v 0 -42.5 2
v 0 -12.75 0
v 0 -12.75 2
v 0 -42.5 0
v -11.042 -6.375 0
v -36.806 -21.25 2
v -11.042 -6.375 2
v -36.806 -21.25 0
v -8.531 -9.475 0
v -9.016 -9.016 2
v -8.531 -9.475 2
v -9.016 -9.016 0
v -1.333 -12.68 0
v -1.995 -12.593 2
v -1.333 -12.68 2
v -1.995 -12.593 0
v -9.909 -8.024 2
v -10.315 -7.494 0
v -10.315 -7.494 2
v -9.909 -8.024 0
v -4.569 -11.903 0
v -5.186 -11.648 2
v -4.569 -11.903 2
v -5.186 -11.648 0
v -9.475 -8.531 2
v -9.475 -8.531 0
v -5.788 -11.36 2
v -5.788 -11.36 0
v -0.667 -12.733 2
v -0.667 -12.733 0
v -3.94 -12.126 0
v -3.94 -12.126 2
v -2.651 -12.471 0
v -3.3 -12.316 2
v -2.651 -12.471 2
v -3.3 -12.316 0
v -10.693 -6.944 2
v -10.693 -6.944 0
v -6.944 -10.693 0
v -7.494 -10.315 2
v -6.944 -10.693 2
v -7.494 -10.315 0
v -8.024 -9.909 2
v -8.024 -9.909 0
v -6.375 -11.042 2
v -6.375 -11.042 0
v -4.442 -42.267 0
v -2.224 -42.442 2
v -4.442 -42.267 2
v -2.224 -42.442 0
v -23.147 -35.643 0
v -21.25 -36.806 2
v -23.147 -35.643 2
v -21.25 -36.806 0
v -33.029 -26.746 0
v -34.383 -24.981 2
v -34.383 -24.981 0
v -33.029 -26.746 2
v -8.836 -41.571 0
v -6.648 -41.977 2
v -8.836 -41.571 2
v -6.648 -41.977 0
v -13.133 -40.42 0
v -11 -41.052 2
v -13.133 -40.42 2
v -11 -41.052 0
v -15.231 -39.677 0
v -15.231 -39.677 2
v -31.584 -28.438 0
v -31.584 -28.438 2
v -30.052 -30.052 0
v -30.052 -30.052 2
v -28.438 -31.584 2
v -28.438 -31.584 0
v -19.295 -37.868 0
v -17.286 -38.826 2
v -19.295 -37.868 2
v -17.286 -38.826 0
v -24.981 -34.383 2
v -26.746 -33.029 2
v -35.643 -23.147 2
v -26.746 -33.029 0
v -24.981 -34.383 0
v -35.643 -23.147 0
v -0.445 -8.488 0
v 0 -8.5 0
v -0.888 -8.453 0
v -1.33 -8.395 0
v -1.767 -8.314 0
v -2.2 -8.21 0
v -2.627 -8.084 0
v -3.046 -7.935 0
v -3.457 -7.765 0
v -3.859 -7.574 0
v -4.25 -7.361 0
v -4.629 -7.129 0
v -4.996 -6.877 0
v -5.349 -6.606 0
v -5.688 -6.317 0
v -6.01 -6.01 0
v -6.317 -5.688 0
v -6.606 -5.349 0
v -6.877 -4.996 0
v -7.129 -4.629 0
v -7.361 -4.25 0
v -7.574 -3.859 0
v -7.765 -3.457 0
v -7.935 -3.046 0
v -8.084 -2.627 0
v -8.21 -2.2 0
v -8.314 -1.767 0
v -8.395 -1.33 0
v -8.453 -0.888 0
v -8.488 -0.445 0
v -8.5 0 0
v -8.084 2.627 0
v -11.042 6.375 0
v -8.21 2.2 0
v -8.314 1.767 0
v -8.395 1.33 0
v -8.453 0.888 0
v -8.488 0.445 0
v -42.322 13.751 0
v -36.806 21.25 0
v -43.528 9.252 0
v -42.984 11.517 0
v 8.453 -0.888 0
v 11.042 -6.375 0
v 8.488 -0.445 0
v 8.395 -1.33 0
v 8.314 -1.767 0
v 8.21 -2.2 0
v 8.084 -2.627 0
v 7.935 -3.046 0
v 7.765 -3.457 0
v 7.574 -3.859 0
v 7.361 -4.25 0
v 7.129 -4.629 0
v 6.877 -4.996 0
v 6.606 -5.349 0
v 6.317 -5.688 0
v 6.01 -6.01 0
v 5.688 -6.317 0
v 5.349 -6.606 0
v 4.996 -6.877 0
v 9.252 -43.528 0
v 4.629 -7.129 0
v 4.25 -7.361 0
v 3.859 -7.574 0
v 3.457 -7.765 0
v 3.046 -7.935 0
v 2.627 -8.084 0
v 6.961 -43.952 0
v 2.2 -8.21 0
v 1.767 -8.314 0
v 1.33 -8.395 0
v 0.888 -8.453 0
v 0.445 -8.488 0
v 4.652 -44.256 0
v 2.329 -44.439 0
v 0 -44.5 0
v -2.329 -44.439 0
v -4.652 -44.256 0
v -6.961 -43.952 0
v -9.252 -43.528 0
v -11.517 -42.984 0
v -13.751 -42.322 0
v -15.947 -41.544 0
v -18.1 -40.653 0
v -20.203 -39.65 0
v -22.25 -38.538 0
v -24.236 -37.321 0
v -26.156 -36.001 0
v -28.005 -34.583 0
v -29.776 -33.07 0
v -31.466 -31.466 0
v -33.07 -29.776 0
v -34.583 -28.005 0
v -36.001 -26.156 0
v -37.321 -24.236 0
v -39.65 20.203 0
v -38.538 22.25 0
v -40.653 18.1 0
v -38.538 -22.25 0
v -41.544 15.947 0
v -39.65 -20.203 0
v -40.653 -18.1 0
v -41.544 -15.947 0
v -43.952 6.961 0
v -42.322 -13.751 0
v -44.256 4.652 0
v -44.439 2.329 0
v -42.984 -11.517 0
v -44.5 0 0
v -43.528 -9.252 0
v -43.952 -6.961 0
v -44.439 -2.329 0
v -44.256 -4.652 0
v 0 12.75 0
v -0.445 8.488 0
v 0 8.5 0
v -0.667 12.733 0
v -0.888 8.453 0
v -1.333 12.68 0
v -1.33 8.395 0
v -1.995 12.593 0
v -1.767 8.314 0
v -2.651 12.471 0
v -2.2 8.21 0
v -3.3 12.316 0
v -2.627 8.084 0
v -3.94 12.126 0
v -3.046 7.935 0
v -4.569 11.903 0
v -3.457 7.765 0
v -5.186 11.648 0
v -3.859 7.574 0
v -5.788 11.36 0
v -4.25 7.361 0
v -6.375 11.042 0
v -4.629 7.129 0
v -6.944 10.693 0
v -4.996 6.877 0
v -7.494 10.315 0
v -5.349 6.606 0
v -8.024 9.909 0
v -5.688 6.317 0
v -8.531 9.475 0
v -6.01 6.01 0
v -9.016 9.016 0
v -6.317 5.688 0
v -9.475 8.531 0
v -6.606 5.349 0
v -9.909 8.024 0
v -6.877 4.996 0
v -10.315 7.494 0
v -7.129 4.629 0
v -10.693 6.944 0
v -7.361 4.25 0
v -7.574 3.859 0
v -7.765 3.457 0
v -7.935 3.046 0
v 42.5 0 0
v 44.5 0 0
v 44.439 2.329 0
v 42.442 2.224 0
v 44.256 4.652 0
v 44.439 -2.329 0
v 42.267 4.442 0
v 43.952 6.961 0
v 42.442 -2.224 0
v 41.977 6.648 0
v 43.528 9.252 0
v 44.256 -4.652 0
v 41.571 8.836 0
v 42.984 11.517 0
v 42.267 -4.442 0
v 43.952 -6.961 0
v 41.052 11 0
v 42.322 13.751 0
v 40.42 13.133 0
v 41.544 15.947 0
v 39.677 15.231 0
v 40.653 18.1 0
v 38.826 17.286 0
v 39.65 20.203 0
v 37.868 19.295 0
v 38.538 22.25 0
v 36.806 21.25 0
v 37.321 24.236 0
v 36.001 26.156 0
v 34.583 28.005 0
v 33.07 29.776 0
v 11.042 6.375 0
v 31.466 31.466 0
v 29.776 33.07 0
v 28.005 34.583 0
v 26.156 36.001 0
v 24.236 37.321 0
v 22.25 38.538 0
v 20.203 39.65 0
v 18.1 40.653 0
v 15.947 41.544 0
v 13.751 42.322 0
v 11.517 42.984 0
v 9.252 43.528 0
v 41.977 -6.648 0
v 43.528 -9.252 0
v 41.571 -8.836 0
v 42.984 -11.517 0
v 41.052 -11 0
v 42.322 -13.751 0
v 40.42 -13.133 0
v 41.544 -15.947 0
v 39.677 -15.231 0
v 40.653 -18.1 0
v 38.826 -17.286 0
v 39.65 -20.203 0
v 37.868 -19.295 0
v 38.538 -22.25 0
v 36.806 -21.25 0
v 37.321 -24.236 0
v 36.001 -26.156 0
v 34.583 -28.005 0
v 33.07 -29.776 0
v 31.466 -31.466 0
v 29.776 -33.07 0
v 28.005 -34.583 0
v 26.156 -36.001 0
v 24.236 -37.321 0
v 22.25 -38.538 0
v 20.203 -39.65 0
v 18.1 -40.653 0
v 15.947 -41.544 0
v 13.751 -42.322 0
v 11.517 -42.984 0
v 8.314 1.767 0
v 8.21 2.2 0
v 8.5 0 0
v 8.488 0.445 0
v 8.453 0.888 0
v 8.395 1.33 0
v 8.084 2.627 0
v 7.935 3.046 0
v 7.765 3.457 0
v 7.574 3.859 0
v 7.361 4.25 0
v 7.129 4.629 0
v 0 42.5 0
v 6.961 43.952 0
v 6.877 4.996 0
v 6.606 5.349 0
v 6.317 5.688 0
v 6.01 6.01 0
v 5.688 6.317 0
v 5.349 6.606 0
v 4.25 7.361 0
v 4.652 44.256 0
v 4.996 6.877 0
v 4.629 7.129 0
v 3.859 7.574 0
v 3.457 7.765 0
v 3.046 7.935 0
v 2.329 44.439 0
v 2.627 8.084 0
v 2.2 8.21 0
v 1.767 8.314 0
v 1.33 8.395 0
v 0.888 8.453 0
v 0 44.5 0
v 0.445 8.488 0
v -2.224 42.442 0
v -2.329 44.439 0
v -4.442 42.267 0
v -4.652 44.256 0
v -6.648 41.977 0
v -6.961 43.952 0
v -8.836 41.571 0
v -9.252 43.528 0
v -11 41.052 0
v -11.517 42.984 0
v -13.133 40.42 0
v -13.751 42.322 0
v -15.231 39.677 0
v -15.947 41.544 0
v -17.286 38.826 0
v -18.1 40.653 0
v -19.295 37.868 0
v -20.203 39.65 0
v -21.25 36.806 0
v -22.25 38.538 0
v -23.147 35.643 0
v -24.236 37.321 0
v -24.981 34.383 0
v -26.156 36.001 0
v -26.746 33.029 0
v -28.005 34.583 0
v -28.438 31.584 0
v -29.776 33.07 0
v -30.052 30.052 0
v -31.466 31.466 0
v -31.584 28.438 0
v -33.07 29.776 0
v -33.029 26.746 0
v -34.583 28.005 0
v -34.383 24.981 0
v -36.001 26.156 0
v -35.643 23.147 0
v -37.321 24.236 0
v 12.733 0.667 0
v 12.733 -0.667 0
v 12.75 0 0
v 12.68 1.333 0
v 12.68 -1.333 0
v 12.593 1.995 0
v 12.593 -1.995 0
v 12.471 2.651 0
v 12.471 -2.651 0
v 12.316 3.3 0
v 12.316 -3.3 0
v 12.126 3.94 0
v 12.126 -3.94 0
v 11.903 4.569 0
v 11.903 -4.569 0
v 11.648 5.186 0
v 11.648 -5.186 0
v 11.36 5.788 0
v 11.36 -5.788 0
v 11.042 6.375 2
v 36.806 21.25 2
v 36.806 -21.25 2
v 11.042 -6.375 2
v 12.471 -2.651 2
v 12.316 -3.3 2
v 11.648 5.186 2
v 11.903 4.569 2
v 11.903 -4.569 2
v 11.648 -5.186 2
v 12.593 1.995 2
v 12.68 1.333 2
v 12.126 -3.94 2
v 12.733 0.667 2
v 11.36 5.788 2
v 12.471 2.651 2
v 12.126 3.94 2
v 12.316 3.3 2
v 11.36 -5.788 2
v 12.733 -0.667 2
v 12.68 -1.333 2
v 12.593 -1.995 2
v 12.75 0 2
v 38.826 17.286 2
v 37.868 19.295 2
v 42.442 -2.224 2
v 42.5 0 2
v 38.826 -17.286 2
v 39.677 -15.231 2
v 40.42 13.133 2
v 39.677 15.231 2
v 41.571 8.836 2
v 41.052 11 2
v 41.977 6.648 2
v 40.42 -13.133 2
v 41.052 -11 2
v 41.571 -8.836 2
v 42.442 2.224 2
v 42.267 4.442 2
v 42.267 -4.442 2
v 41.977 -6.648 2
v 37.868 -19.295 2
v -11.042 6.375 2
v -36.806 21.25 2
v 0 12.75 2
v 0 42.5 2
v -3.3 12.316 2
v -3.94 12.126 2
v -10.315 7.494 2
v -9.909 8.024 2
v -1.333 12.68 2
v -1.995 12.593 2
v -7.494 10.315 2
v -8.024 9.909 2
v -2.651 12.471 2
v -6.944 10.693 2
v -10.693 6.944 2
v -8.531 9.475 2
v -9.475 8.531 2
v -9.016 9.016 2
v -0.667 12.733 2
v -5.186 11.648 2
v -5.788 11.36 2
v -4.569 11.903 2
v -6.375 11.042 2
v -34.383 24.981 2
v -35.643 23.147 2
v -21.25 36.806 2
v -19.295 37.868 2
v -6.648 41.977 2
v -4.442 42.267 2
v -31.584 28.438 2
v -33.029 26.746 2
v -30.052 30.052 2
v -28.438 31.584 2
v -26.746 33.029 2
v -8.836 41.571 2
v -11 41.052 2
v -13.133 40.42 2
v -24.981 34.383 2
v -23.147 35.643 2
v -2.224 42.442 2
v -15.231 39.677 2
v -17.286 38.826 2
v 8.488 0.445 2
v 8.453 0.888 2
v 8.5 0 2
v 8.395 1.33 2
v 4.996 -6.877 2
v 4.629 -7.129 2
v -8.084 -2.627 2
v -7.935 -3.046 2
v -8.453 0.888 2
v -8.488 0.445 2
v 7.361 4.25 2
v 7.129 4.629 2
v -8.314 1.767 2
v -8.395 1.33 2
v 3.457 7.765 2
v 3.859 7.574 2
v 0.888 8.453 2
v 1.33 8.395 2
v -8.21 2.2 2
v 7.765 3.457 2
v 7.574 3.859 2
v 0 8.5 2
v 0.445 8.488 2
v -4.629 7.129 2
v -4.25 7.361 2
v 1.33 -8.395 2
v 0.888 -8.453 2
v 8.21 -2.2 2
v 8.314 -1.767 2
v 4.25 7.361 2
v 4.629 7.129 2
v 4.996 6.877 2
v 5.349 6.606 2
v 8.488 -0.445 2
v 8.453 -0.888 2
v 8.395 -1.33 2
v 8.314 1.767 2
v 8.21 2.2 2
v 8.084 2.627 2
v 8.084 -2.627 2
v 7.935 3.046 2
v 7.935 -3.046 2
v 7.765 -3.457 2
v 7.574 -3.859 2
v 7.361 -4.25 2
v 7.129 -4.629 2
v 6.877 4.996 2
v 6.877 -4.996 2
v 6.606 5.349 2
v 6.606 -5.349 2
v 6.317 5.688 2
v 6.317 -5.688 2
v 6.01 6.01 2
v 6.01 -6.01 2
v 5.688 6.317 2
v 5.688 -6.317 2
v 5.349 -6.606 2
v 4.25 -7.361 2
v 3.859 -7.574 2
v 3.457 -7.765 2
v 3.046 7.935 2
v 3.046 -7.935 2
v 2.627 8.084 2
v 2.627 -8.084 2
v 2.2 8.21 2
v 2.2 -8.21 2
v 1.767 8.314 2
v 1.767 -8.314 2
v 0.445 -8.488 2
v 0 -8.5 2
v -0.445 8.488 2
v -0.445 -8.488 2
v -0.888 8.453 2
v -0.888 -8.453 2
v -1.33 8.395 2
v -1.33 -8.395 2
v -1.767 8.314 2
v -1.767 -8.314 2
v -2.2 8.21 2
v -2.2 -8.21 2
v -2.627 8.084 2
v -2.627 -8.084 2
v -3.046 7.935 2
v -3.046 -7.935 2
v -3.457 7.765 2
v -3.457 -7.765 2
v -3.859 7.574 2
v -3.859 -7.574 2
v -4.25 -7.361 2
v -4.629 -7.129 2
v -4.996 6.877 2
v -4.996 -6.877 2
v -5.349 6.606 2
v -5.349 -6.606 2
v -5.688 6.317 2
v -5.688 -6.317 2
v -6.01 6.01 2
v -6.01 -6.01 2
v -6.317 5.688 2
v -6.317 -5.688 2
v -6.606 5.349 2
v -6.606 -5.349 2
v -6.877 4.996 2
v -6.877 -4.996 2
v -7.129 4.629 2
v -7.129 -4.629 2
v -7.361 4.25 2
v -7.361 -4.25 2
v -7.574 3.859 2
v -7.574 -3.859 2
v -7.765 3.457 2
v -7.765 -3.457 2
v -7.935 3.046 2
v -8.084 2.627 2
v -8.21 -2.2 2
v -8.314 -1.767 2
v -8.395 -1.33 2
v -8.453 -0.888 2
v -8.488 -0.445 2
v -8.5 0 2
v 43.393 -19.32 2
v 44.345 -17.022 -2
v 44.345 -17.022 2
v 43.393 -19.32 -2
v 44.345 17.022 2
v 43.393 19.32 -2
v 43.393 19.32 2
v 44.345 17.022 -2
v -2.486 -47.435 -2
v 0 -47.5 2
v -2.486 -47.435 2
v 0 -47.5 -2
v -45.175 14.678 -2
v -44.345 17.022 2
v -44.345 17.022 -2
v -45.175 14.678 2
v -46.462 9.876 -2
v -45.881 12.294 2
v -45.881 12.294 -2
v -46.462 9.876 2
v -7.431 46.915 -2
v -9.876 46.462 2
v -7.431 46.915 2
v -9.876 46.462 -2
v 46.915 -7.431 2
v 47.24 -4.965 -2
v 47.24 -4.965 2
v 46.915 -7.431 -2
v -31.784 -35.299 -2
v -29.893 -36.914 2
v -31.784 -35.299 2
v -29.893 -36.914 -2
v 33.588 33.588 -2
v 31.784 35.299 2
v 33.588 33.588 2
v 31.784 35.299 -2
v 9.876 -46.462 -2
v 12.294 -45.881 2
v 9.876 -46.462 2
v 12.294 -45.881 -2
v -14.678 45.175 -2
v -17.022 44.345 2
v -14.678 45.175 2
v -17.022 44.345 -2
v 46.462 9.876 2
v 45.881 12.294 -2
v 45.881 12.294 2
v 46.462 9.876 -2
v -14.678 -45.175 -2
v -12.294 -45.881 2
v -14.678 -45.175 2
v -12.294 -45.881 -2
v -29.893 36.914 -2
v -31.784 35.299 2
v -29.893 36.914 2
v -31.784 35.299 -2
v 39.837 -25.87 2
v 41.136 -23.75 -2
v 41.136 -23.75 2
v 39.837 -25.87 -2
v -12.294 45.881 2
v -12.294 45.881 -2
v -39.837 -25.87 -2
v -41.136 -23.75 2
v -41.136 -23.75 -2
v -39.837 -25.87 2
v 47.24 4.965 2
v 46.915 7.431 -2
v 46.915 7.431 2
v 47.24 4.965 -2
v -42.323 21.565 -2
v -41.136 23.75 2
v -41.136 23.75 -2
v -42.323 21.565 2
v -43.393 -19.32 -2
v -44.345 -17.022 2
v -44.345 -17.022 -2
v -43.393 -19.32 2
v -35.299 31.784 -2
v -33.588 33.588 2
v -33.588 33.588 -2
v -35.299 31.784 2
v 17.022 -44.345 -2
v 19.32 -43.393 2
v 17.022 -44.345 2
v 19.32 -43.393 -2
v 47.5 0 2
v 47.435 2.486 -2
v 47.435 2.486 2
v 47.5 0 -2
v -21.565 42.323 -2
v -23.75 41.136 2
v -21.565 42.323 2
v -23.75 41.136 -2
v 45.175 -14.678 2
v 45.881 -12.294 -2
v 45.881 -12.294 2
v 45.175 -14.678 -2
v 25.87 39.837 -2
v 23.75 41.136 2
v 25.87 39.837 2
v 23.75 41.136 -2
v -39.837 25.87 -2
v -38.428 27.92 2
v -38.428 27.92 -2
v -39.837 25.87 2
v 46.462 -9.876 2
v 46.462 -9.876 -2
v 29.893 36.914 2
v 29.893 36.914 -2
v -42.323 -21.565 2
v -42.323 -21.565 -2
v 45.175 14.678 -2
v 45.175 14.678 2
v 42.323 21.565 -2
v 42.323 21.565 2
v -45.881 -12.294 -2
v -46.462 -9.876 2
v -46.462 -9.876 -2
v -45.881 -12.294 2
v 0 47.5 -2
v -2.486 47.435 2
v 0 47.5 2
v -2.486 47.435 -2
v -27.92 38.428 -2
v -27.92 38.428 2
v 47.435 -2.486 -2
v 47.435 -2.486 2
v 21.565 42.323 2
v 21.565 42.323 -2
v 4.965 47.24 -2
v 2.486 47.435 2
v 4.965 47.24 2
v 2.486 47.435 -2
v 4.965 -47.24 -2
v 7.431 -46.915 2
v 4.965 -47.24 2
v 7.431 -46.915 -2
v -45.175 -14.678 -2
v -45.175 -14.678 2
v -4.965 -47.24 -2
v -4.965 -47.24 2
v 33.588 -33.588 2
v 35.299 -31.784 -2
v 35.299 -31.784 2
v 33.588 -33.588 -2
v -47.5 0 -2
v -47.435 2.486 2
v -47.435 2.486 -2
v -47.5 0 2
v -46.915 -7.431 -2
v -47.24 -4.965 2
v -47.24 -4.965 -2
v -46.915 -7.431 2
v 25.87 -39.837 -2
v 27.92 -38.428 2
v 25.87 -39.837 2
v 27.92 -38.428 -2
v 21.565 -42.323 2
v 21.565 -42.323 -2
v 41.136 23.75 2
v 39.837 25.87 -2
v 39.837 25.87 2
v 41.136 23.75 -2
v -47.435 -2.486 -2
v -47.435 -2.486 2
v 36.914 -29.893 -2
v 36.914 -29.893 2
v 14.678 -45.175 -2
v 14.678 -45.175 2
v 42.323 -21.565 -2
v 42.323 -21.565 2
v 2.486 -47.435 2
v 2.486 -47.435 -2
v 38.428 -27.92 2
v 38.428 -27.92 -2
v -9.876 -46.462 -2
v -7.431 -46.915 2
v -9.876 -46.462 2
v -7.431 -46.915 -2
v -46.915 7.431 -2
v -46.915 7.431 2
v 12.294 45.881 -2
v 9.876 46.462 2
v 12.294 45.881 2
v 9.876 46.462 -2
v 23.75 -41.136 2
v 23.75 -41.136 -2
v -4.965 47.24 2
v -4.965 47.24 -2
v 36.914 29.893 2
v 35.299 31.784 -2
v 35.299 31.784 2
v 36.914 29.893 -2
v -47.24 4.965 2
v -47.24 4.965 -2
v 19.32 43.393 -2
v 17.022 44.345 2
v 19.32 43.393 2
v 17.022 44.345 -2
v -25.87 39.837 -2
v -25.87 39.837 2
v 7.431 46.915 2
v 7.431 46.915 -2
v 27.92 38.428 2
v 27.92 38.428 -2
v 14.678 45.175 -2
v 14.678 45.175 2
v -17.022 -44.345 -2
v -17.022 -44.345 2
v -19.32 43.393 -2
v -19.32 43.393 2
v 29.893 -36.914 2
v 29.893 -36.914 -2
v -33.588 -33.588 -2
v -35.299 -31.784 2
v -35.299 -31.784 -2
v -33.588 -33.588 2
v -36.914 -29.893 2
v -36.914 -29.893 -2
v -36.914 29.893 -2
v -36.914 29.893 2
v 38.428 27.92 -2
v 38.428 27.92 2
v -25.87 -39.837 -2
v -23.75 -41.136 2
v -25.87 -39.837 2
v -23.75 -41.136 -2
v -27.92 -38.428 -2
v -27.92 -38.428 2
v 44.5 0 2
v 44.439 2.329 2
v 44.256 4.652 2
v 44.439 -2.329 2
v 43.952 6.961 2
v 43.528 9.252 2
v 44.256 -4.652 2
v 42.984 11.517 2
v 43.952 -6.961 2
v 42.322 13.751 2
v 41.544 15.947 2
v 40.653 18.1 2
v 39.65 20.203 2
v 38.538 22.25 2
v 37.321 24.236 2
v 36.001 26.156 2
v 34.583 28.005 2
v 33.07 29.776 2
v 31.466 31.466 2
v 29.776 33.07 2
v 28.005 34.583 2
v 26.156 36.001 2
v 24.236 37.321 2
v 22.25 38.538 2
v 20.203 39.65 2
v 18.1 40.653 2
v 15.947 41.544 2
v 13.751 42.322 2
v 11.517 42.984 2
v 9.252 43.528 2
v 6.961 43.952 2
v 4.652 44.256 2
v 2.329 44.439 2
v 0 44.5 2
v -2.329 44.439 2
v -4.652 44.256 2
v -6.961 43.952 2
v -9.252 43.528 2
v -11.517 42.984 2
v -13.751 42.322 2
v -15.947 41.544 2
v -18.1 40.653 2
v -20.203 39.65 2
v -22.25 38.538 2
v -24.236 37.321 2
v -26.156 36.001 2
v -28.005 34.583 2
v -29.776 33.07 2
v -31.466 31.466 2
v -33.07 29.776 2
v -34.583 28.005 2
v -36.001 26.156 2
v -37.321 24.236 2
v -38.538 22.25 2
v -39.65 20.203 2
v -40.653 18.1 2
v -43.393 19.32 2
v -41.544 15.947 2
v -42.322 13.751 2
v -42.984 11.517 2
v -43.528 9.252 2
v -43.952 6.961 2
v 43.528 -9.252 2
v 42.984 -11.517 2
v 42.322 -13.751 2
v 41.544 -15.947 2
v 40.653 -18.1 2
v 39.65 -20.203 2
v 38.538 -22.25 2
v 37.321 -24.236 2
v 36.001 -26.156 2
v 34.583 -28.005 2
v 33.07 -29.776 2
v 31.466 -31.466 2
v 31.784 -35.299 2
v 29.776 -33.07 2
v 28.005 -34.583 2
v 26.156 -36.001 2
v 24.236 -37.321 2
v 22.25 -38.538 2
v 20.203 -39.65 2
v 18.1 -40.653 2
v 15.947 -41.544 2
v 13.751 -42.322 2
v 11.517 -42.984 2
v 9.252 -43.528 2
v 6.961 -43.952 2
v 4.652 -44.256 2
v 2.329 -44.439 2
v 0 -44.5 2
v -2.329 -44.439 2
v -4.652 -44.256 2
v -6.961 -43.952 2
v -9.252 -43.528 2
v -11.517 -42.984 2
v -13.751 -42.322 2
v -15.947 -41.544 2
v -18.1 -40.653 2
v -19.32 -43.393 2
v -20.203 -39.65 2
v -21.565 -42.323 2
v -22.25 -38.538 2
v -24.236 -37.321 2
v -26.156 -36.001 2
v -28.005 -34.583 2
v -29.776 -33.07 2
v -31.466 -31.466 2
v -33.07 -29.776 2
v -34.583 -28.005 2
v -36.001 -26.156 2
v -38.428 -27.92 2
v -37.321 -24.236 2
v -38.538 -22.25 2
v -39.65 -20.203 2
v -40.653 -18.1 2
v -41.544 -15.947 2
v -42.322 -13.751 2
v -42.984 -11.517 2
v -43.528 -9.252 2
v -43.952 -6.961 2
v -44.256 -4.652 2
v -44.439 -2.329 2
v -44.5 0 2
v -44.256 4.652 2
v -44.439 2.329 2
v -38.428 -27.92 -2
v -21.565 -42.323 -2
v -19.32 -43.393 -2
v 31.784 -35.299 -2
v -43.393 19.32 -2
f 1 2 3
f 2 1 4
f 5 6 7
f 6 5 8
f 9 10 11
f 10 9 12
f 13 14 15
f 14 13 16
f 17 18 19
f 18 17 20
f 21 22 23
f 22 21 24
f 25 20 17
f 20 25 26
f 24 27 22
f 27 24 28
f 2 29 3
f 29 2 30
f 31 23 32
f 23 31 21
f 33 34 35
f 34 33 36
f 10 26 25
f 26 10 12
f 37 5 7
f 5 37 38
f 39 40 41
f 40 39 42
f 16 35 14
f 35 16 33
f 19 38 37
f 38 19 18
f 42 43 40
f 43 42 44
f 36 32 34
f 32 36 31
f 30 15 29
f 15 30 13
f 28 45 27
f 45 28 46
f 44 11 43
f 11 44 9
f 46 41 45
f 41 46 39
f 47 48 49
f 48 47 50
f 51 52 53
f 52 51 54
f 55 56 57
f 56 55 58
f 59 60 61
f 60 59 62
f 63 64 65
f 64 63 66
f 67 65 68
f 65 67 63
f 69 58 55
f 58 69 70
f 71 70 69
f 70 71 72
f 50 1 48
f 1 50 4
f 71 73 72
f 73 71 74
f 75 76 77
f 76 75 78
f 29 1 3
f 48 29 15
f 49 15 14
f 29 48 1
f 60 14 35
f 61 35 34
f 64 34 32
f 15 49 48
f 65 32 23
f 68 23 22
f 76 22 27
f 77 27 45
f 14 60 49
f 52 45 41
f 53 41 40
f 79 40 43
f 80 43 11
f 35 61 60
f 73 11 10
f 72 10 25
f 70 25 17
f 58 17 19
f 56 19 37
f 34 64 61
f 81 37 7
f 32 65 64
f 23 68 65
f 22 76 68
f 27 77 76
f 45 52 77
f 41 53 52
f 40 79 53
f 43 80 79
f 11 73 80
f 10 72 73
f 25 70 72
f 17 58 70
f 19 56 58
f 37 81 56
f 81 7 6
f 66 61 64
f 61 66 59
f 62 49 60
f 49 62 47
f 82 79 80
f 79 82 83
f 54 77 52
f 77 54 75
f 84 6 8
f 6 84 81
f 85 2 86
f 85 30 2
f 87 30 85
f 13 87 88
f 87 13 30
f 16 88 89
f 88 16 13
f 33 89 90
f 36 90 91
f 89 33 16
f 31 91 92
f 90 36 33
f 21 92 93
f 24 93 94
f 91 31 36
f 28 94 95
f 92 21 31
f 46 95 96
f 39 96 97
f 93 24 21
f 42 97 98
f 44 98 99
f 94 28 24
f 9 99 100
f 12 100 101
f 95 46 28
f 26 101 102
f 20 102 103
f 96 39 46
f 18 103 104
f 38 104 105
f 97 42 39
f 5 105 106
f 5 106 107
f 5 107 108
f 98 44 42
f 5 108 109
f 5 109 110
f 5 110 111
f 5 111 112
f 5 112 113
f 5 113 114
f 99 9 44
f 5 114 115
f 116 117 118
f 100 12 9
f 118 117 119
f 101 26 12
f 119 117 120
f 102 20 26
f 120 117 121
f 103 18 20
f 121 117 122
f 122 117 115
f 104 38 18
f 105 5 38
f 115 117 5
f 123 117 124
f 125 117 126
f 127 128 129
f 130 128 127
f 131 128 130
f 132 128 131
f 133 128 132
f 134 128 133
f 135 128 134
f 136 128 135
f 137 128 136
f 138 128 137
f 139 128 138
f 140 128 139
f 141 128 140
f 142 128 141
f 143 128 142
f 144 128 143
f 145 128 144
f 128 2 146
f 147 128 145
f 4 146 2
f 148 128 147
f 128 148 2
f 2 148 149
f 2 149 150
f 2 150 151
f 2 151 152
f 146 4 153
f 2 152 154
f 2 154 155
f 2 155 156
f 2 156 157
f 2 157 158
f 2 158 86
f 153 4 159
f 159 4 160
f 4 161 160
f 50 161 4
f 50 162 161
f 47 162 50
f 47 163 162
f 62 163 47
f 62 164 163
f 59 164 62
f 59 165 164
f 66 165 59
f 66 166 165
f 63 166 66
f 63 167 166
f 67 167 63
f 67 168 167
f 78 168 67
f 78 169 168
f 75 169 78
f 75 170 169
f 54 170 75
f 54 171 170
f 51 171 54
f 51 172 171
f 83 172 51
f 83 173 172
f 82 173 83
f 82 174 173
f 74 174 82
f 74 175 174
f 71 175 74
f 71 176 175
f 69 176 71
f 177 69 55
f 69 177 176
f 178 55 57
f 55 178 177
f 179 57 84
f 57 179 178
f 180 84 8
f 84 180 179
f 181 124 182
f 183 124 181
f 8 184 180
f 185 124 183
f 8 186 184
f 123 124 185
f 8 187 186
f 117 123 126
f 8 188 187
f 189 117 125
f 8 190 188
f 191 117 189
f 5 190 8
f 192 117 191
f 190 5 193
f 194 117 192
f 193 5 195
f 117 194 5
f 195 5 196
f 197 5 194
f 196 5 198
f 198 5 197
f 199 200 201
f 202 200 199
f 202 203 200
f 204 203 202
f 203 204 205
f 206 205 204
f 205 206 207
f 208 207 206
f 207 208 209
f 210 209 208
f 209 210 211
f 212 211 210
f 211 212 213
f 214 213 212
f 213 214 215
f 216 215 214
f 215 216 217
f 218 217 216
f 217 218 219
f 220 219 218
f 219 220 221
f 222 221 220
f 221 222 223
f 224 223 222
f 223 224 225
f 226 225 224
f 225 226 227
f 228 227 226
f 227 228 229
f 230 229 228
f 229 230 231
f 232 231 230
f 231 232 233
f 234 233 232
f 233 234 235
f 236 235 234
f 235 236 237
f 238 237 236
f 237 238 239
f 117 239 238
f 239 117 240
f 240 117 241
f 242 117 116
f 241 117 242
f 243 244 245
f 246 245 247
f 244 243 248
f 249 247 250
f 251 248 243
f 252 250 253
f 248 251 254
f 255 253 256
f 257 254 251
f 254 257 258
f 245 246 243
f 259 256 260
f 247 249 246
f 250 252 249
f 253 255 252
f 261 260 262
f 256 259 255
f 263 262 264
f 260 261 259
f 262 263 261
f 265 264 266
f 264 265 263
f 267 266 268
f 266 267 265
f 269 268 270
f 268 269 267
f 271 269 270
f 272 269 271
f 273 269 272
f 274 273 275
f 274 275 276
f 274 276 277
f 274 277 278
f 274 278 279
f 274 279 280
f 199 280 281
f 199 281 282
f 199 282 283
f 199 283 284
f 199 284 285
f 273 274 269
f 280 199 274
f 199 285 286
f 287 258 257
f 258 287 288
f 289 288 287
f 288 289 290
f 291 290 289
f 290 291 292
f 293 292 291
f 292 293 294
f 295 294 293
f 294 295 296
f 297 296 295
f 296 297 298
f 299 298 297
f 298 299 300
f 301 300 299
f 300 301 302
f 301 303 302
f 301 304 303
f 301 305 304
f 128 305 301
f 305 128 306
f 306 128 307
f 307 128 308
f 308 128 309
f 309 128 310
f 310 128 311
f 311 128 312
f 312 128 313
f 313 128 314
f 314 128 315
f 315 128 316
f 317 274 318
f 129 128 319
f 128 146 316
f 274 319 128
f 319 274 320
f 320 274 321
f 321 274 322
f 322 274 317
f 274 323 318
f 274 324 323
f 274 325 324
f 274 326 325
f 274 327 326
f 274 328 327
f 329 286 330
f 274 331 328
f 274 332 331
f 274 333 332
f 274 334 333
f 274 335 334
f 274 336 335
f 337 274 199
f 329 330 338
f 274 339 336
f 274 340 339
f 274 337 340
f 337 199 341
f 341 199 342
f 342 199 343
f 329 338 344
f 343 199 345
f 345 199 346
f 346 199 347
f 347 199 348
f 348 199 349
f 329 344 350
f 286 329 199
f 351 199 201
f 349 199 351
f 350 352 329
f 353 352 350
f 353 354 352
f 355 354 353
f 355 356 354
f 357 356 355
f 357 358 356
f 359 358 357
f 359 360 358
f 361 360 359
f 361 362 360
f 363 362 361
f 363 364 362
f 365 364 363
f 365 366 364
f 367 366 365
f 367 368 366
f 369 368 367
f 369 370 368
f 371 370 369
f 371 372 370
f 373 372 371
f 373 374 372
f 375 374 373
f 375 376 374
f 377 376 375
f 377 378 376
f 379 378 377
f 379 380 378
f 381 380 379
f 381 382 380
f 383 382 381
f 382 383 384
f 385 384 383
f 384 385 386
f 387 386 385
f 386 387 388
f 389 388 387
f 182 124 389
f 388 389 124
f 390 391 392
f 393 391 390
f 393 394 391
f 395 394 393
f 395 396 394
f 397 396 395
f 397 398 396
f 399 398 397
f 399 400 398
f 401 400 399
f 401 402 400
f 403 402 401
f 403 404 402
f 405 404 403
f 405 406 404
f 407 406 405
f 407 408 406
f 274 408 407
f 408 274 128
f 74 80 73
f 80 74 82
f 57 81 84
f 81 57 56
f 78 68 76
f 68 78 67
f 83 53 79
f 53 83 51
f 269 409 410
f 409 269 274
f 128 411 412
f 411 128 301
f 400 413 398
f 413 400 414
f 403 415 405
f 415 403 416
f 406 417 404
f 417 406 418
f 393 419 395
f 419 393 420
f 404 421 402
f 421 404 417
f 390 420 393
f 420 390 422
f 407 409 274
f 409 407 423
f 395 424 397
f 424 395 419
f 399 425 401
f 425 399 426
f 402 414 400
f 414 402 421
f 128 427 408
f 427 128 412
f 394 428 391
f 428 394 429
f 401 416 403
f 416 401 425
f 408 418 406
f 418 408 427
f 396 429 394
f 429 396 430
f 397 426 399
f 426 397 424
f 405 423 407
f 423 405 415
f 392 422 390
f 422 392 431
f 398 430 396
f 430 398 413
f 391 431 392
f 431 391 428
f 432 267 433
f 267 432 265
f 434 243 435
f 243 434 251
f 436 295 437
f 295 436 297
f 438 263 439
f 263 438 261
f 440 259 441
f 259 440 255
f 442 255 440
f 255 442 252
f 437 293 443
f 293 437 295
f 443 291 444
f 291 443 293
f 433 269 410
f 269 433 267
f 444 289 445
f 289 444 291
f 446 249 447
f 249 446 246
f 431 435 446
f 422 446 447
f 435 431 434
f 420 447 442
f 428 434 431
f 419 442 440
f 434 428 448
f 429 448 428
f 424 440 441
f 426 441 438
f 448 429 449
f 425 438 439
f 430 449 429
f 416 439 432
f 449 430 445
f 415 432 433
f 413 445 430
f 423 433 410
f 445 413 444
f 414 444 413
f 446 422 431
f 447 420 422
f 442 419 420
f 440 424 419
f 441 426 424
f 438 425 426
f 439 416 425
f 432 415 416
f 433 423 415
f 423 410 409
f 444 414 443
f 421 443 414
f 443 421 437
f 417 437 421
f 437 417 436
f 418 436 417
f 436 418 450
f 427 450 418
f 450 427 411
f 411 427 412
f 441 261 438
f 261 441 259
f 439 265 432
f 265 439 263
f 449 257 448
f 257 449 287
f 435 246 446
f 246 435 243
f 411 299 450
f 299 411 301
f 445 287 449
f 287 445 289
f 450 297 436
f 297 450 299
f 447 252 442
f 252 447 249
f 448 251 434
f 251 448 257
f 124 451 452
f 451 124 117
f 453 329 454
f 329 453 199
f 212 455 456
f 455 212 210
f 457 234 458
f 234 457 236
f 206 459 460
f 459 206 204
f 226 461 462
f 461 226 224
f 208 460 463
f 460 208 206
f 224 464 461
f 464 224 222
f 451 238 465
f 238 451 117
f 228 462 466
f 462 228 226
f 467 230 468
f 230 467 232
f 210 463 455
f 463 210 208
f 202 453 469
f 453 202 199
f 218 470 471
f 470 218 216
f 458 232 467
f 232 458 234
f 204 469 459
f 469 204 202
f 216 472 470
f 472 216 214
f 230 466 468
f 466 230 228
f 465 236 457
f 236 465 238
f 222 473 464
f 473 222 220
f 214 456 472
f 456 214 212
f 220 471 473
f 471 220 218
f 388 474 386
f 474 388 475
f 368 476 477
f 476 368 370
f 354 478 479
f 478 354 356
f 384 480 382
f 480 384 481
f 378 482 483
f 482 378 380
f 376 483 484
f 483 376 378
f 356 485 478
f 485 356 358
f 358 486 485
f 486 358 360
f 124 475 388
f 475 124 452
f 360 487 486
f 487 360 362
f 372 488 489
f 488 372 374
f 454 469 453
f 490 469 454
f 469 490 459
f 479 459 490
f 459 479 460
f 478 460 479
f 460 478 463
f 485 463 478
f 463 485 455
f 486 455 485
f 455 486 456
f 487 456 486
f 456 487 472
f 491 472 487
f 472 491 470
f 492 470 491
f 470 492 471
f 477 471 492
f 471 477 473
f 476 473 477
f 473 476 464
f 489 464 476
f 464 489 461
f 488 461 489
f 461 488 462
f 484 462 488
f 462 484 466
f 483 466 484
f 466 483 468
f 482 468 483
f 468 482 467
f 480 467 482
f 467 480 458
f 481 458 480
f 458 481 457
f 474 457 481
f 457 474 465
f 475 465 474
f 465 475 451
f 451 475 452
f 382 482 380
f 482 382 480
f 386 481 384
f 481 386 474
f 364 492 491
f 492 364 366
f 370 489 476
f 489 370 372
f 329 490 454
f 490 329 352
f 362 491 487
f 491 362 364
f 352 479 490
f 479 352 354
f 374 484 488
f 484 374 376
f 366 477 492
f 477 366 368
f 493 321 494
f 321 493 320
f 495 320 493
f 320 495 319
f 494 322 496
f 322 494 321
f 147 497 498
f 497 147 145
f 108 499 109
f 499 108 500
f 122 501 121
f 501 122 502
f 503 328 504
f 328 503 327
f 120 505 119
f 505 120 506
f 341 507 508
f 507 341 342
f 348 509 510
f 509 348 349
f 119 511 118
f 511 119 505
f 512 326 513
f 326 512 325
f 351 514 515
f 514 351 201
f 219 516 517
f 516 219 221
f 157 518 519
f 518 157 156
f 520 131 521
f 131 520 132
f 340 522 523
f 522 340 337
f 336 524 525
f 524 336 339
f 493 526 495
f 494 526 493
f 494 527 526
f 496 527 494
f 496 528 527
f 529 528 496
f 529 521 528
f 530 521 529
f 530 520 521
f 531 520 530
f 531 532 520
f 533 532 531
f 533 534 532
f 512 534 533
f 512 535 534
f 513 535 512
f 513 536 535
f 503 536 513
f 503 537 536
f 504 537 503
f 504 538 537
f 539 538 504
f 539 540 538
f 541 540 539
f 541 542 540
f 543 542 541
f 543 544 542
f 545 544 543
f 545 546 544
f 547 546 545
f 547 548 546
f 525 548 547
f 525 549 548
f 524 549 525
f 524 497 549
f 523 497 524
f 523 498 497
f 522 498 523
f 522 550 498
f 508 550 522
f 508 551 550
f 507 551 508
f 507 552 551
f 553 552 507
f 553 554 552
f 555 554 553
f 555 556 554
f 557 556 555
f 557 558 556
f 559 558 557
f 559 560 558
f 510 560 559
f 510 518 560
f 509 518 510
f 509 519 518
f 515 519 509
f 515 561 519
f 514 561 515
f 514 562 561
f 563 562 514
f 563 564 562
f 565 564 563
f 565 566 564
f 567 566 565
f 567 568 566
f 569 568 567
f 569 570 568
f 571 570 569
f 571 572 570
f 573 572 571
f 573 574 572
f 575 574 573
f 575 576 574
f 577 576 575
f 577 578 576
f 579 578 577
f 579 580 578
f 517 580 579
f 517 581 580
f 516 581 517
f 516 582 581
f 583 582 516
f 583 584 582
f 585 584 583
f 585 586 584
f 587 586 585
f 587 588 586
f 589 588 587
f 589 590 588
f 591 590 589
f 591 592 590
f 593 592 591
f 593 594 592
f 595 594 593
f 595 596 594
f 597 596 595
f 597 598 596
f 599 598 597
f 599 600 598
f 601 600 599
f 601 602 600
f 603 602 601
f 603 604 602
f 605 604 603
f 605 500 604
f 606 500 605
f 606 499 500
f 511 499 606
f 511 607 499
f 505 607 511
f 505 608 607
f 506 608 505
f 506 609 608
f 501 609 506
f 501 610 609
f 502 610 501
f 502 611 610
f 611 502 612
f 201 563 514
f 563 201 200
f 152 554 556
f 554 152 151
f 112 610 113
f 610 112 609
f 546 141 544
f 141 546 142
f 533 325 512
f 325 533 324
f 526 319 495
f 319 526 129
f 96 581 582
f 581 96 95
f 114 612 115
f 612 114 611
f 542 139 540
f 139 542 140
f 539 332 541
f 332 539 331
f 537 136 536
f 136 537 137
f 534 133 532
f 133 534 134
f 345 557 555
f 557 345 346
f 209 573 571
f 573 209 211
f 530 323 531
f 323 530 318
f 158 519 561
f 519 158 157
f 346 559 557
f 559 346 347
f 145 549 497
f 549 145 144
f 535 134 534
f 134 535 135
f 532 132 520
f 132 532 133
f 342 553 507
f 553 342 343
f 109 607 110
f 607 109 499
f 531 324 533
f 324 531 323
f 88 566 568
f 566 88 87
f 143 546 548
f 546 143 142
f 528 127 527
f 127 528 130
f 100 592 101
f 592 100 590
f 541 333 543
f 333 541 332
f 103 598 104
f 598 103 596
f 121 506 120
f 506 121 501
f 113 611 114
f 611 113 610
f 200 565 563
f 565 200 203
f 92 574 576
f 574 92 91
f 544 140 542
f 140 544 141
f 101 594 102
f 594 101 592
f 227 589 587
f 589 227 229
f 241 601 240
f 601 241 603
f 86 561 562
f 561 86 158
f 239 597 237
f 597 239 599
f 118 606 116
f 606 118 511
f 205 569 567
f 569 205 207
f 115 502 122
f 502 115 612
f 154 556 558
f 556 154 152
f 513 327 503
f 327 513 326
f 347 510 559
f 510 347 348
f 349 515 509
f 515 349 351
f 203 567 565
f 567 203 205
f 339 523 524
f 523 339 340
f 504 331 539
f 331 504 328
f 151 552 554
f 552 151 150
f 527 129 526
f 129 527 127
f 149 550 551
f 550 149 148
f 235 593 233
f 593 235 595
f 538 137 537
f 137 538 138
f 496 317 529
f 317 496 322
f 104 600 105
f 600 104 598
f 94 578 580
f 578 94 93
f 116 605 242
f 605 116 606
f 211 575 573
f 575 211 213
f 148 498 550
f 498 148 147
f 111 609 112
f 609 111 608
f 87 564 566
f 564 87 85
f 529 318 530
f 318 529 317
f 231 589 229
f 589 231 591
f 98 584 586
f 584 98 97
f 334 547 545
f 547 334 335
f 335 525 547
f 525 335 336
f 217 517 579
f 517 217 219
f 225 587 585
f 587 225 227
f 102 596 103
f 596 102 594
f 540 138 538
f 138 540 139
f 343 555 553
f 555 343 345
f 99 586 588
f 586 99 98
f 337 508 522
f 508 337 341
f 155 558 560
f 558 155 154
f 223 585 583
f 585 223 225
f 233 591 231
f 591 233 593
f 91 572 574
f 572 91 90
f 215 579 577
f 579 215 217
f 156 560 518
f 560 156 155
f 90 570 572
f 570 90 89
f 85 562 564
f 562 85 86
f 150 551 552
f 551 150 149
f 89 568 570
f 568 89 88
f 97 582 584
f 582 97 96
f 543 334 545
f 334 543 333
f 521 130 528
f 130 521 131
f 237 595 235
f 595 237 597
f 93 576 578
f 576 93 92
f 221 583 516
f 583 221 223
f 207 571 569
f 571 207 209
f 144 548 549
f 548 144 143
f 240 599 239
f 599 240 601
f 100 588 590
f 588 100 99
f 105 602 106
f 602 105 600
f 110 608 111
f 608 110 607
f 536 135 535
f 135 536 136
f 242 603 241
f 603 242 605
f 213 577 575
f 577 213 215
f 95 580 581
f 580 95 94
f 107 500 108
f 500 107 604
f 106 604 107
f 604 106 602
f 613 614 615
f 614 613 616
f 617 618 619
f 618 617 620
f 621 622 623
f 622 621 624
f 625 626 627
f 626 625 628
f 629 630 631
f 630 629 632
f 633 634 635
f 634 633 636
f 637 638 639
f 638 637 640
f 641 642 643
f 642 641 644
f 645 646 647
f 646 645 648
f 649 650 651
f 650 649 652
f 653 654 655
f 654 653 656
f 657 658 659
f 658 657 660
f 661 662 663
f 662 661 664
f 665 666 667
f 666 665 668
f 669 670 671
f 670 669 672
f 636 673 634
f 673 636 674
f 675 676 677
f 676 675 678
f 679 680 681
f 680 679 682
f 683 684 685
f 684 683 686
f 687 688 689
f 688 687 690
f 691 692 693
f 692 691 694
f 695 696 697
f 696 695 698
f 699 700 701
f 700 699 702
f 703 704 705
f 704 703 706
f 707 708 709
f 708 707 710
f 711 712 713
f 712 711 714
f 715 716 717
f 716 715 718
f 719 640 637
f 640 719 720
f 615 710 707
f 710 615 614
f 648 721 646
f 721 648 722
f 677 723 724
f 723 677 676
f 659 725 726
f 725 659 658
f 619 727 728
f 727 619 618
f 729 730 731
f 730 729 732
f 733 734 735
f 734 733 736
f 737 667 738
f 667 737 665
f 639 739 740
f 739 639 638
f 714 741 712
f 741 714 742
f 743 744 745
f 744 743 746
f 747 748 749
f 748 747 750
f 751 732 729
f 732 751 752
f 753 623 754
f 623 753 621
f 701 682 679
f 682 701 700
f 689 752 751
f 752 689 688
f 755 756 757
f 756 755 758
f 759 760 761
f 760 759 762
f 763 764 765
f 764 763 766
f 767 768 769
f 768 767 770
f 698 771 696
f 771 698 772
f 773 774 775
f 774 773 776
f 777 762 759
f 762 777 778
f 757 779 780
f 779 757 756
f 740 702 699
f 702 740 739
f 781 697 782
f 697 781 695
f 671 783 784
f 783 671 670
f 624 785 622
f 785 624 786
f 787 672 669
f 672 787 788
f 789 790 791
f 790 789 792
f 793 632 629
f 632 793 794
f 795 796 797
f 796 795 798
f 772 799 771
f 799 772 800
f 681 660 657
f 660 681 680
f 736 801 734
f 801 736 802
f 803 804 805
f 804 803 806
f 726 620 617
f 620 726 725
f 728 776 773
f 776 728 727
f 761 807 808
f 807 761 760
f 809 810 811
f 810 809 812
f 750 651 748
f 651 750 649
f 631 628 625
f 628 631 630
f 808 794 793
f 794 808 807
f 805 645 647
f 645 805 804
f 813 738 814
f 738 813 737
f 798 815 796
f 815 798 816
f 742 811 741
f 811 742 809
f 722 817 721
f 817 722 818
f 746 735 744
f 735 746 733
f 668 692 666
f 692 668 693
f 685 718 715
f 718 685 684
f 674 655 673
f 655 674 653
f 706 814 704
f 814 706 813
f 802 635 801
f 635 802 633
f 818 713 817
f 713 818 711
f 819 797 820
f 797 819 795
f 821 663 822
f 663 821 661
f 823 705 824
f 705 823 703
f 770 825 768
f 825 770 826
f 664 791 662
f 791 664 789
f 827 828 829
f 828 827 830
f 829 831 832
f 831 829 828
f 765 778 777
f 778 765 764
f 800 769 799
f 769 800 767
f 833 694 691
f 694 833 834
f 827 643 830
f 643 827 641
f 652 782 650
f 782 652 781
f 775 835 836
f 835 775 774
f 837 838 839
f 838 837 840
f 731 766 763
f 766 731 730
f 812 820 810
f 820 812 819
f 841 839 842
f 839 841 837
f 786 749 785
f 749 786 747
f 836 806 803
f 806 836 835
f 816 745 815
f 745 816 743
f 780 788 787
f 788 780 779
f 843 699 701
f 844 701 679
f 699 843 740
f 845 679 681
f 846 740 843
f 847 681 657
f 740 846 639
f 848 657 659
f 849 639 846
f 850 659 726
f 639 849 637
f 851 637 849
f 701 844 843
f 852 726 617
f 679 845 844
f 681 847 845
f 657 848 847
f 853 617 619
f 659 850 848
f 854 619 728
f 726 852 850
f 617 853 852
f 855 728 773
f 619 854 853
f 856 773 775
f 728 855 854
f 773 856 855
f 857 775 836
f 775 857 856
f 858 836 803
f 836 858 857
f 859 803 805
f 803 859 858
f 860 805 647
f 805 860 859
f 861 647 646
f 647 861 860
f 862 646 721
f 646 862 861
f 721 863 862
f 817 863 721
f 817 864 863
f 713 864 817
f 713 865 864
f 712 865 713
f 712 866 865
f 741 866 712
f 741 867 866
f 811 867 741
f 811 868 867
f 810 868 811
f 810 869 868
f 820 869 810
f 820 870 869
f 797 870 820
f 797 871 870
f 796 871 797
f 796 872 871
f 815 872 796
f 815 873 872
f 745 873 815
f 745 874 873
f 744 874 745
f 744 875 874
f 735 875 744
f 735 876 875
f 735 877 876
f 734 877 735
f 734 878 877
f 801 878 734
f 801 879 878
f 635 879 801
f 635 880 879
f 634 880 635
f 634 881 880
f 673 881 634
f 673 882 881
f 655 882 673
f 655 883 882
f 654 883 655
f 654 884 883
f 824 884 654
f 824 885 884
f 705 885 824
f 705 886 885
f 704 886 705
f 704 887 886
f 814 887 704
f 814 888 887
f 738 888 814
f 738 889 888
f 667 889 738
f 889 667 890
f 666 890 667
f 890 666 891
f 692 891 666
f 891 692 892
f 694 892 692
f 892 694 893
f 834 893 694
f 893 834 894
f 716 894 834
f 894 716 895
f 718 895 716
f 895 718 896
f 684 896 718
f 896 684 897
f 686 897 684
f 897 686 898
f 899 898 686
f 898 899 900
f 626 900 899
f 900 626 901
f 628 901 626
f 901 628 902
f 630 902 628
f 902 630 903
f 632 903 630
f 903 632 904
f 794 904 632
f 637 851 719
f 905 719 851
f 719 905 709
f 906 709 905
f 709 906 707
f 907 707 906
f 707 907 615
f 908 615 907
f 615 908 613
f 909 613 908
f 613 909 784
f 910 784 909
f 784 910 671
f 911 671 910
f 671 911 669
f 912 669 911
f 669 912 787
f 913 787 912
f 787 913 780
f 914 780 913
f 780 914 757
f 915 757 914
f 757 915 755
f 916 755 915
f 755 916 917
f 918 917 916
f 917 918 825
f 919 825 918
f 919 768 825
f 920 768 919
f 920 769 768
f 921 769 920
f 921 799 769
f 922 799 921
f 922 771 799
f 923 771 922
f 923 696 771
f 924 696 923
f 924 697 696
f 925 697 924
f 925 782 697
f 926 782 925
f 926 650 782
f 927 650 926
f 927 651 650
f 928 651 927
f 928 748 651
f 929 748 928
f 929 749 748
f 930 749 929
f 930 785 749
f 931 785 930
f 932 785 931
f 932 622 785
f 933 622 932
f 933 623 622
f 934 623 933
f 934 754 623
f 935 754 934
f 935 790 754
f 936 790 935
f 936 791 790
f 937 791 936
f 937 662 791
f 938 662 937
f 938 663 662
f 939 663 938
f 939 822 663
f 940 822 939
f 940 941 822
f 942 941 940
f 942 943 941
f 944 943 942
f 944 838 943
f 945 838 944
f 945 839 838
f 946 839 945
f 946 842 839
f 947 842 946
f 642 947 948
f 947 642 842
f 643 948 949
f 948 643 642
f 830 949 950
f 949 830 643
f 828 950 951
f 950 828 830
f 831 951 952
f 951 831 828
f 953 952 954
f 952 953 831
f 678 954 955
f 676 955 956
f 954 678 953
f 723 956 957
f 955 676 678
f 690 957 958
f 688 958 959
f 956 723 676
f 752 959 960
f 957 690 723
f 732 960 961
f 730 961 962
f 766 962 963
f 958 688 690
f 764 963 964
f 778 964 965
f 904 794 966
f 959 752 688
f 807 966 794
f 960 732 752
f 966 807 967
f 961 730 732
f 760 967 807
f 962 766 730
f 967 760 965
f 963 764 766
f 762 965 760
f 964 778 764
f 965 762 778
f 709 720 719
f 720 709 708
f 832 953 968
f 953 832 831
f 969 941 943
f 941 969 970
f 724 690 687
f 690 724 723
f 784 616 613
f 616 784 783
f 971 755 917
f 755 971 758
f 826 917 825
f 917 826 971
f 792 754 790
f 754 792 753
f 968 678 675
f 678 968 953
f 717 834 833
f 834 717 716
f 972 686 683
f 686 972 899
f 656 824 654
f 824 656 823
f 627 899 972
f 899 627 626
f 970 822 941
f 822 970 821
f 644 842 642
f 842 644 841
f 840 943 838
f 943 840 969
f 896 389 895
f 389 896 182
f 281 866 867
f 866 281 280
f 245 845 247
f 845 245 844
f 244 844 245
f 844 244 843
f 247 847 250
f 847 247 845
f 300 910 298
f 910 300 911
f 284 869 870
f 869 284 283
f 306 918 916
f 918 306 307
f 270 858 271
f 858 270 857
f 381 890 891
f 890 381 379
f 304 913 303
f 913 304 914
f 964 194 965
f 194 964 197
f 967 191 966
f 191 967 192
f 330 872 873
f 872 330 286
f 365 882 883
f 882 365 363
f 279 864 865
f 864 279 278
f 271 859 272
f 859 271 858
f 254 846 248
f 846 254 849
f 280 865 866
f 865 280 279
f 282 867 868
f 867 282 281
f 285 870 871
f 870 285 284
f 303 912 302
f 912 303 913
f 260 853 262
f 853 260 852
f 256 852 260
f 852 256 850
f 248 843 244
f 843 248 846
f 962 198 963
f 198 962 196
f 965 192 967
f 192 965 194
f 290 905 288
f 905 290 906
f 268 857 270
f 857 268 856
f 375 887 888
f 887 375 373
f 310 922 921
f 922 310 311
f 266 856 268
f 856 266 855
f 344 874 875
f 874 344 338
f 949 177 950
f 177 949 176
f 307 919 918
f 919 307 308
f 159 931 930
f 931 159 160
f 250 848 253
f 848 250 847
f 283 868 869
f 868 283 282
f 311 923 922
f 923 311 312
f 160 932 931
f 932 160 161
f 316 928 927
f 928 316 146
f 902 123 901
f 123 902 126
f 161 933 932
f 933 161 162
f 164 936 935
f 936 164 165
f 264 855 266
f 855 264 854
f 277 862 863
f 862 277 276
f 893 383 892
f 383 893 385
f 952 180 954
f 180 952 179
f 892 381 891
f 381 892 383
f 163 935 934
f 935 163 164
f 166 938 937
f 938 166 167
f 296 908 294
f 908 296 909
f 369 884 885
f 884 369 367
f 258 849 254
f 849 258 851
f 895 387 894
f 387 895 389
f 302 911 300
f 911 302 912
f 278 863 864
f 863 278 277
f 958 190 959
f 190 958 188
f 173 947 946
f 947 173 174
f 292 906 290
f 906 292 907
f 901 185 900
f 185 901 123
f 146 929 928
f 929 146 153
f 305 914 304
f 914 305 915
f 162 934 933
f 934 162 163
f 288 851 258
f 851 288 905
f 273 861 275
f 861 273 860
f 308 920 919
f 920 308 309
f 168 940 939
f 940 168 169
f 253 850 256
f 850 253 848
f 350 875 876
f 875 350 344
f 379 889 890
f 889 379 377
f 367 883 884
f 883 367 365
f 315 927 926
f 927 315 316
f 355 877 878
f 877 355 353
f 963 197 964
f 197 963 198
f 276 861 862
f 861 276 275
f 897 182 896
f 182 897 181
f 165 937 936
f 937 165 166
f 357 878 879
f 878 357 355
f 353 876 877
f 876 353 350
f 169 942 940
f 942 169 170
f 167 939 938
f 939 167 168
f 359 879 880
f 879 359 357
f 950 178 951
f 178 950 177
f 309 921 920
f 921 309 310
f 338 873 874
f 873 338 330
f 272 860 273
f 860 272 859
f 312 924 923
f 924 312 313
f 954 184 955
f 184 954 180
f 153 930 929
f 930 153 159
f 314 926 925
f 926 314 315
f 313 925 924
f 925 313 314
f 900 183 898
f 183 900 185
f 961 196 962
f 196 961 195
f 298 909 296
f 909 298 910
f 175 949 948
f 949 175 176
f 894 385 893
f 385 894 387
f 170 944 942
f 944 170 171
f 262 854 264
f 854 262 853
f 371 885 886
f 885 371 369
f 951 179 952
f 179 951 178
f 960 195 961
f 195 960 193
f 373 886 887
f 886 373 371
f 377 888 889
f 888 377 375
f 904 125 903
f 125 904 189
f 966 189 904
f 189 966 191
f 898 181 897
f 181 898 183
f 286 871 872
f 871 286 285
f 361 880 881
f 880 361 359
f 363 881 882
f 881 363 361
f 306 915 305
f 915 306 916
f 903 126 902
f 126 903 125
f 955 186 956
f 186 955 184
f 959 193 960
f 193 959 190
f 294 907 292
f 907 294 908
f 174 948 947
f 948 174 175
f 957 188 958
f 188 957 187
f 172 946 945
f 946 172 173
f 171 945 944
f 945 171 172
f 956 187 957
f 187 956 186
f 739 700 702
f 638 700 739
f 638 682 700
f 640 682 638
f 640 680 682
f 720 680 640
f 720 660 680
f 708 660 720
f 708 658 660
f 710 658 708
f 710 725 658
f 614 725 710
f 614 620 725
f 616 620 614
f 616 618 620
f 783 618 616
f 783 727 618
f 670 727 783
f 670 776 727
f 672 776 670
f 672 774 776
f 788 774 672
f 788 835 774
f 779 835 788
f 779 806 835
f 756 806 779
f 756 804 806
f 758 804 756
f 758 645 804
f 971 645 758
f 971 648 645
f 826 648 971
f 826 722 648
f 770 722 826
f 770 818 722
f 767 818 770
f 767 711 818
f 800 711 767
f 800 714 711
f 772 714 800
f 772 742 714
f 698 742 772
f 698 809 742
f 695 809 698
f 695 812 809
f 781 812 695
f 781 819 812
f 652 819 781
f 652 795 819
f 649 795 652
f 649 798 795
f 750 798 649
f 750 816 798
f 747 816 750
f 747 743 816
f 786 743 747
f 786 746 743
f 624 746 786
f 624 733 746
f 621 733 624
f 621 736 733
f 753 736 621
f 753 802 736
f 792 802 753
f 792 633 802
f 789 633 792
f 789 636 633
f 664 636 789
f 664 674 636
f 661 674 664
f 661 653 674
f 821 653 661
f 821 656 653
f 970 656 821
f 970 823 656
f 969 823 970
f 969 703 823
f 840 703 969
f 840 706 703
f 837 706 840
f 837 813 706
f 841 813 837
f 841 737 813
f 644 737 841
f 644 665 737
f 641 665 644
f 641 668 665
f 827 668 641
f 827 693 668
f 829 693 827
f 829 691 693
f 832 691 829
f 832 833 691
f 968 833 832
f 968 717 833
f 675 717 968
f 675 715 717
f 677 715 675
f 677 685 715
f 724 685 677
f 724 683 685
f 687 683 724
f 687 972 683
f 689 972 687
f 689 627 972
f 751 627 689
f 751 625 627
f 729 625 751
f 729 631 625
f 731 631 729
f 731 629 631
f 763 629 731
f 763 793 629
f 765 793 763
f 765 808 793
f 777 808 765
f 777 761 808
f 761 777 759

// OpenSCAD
module branch(height,diameter,out_rat){
    difference(){
        cylinder(h=height, d=diameter);
        translate([0, 0, -height/2])
        {
            translate([0,-diameter,])cube([diameter,2*diameter,2*height]);
            rotate([0,0,120]) translate([0, -diameter,0]) cube([diameter,2*diameter,2*height]);
            cylinder(h=2*height, d=(1-out_rat)*diameter);
        }
    }
}

module radiation(diameter = 95, height = 2, out_rat = 0.25, in_rat = 0.2){

    branch(height,diameter,out_rat);
    rotate([0,0,120]) branch(height,diameter,out_rat);
    rotate([0,0,240]) branch(height,diameter,out_rat);
    
    cylinder(d = in_rat*diameter, height);
    
}

module bottom(height = 2,diameter=95,border_rad=5){
   translate([0,0,-height]) cylinder(d=diameter+2*(border_rad), height);
}
module border(height = 2,diameter=95,border=3,border_offset=2){
        difference(){
            cylinder(d=diameter+2*(border+border_offset), height);
            cylinder(d=diameter+2*(border_offset), 3*height, center=true);
            }
    
}
 /*
radiation();
bottom();
border();

*/

module radiation_coaster(radiation_diameter = 85, radiation_height = 2, radiation_ration = 0.70, radiation_inner_ratio = 0.2,  lower_plate_height = 2, border_thickness = 3, border_offset = 2, border_height = 2){
    
    radiation(radiation_diameter, radiation_height, radiation_ration, radiation_inner_ratio);
    
    bottom(lower_plate_height, radiation_diameter, border_thickness + border_offset);
    border(border_height, radiation_diameter, border_thickness, border_offset);

    
}

$fn=$preview ? 36 : 120;
radiation_coaster();
